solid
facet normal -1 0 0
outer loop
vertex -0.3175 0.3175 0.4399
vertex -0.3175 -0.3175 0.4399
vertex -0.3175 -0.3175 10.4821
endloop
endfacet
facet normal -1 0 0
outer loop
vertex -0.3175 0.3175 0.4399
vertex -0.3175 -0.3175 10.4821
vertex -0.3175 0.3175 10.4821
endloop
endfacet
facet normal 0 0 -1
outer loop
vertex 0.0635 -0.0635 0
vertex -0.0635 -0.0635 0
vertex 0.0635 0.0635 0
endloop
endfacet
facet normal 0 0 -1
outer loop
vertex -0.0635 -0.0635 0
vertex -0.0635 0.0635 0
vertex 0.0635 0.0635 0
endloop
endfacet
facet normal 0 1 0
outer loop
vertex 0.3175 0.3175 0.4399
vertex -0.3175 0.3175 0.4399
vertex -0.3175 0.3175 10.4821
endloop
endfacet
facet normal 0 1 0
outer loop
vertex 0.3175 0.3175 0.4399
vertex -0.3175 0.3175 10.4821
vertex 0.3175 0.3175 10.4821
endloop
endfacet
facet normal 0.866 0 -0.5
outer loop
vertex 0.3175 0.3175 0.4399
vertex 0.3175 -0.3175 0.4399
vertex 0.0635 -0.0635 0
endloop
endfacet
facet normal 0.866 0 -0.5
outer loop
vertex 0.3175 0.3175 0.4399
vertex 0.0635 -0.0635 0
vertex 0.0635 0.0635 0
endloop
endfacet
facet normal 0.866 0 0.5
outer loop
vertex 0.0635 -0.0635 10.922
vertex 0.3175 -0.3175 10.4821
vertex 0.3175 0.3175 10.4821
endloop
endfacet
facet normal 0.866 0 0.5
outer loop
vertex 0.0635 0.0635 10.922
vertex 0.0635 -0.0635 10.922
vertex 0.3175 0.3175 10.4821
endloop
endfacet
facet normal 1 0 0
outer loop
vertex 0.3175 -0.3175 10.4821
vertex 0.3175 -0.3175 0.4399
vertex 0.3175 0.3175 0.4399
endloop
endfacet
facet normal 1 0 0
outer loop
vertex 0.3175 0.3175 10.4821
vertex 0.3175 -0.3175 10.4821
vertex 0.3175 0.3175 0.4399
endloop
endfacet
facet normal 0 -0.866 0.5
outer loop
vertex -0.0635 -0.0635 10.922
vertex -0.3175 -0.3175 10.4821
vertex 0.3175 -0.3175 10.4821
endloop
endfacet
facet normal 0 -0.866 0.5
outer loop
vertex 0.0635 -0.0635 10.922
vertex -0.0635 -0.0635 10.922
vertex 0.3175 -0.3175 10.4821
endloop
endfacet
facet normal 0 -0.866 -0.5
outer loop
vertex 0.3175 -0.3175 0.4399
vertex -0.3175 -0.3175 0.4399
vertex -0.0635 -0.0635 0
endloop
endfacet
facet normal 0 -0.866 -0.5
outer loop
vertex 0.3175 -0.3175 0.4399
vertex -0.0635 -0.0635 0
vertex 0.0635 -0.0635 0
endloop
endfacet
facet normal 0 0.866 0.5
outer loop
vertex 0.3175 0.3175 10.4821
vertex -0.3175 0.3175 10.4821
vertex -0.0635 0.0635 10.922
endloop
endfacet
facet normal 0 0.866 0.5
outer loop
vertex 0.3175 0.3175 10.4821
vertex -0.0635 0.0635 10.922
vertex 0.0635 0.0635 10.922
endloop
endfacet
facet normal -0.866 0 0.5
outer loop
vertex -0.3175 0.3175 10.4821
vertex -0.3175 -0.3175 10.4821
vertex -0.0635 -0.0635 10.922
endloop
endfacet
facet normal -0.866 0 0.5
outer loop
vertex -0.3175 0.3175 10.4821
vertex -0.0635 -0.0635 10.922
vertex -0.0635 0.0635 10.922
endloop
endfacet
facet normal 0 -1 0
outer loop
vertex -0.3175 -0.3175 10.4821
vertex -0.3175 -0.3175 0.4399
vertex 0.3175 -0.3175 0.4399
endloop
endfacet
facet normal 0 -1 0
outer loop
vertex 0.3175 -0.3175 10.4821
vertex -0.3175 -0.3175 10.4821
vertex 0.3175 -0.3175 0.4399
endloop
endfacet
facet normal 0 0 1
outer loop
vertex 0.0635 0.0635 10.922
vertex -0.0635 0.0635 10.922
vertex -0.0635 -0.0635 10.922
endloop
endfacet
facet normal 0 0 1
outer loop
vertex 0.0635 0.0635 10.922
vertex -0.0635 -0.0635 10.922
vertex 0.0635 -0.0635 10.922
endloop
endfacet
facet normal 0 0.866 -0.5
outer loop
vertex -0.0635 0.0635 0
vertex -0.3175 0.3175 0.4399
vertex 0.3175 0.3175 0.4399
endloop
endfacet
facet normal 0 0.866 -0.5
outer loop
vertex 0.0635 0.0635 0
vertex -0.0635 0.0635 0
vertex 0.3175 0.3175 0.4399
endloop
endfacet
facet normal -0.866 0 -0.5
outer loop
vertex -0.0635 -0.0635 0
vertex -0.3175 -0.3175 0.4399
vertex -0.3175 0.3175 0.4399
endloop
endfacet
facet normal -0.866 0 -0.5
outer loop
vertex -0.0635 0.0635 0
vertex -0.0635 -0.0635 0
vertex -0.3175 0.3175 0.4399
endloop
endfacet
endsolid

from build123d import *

# Parameters (mm, degrees)
SKETCH1_W           = 0.635
SKETCH1_H           = 0.635
BOSS_EXTRUDE1_DEPTH = 10.922
CHAMFER1_SIZE       = 0.254
CHAMFER1_SIZE2      = 0.439940905
CHAMFER2_SIZE       = 0.254
CHAMFER2_SIZE2      = 0.439940905


with BuildPart() as part:
    # Sketch1 → Boss-Extrude1 (new body)
    with BuildSketch(Plane.XY):
        Rectangle(SKETCH1_W, SKETCH1_H)
    extrude(amount=BOSS_EXTRUDE1_DEPTH)

    # Chamfer1
    chamfer1_edges = [part.edges().sort_by_distance(p)[0] for p in [
        (-0.3175, 0, 10.922),
        (0, -0.3175, 10.922),
        (0.3175, 0, 10.922),
        (0, 0.3175, 10.922),
    ]]
    chamfer1_side = [part.faces().sort_by_distance(p)[0] for p in [
        (0, 0, 10.922),
    ]]
    chamfer(chamfer1_edges, length=CHAMFER1_SIZE, length2=CHAMFER1_SIZE2, reference=chamfer1_side[0])

    # Chamfer2
    chamfer2_edges = [part.edges().sort_by_distance(p)[0] for p in [
        (0, -0.3175, 0),
        (-0.3175, 0, 0),
        (0, 0.3175, 0),
        (0.3175, 0, 0),
    ]]
    chamfer2_side = [part.faces().sort_by_distance(p)[0] for p in [
        (0, 0, 0),
    ]]
    chamfer(chamfer2_edges, length=CHAMFER2_SIZE, length2=CHAMFER2_SIZE2, reference=chamfer2_side[0])


solid = part.part
